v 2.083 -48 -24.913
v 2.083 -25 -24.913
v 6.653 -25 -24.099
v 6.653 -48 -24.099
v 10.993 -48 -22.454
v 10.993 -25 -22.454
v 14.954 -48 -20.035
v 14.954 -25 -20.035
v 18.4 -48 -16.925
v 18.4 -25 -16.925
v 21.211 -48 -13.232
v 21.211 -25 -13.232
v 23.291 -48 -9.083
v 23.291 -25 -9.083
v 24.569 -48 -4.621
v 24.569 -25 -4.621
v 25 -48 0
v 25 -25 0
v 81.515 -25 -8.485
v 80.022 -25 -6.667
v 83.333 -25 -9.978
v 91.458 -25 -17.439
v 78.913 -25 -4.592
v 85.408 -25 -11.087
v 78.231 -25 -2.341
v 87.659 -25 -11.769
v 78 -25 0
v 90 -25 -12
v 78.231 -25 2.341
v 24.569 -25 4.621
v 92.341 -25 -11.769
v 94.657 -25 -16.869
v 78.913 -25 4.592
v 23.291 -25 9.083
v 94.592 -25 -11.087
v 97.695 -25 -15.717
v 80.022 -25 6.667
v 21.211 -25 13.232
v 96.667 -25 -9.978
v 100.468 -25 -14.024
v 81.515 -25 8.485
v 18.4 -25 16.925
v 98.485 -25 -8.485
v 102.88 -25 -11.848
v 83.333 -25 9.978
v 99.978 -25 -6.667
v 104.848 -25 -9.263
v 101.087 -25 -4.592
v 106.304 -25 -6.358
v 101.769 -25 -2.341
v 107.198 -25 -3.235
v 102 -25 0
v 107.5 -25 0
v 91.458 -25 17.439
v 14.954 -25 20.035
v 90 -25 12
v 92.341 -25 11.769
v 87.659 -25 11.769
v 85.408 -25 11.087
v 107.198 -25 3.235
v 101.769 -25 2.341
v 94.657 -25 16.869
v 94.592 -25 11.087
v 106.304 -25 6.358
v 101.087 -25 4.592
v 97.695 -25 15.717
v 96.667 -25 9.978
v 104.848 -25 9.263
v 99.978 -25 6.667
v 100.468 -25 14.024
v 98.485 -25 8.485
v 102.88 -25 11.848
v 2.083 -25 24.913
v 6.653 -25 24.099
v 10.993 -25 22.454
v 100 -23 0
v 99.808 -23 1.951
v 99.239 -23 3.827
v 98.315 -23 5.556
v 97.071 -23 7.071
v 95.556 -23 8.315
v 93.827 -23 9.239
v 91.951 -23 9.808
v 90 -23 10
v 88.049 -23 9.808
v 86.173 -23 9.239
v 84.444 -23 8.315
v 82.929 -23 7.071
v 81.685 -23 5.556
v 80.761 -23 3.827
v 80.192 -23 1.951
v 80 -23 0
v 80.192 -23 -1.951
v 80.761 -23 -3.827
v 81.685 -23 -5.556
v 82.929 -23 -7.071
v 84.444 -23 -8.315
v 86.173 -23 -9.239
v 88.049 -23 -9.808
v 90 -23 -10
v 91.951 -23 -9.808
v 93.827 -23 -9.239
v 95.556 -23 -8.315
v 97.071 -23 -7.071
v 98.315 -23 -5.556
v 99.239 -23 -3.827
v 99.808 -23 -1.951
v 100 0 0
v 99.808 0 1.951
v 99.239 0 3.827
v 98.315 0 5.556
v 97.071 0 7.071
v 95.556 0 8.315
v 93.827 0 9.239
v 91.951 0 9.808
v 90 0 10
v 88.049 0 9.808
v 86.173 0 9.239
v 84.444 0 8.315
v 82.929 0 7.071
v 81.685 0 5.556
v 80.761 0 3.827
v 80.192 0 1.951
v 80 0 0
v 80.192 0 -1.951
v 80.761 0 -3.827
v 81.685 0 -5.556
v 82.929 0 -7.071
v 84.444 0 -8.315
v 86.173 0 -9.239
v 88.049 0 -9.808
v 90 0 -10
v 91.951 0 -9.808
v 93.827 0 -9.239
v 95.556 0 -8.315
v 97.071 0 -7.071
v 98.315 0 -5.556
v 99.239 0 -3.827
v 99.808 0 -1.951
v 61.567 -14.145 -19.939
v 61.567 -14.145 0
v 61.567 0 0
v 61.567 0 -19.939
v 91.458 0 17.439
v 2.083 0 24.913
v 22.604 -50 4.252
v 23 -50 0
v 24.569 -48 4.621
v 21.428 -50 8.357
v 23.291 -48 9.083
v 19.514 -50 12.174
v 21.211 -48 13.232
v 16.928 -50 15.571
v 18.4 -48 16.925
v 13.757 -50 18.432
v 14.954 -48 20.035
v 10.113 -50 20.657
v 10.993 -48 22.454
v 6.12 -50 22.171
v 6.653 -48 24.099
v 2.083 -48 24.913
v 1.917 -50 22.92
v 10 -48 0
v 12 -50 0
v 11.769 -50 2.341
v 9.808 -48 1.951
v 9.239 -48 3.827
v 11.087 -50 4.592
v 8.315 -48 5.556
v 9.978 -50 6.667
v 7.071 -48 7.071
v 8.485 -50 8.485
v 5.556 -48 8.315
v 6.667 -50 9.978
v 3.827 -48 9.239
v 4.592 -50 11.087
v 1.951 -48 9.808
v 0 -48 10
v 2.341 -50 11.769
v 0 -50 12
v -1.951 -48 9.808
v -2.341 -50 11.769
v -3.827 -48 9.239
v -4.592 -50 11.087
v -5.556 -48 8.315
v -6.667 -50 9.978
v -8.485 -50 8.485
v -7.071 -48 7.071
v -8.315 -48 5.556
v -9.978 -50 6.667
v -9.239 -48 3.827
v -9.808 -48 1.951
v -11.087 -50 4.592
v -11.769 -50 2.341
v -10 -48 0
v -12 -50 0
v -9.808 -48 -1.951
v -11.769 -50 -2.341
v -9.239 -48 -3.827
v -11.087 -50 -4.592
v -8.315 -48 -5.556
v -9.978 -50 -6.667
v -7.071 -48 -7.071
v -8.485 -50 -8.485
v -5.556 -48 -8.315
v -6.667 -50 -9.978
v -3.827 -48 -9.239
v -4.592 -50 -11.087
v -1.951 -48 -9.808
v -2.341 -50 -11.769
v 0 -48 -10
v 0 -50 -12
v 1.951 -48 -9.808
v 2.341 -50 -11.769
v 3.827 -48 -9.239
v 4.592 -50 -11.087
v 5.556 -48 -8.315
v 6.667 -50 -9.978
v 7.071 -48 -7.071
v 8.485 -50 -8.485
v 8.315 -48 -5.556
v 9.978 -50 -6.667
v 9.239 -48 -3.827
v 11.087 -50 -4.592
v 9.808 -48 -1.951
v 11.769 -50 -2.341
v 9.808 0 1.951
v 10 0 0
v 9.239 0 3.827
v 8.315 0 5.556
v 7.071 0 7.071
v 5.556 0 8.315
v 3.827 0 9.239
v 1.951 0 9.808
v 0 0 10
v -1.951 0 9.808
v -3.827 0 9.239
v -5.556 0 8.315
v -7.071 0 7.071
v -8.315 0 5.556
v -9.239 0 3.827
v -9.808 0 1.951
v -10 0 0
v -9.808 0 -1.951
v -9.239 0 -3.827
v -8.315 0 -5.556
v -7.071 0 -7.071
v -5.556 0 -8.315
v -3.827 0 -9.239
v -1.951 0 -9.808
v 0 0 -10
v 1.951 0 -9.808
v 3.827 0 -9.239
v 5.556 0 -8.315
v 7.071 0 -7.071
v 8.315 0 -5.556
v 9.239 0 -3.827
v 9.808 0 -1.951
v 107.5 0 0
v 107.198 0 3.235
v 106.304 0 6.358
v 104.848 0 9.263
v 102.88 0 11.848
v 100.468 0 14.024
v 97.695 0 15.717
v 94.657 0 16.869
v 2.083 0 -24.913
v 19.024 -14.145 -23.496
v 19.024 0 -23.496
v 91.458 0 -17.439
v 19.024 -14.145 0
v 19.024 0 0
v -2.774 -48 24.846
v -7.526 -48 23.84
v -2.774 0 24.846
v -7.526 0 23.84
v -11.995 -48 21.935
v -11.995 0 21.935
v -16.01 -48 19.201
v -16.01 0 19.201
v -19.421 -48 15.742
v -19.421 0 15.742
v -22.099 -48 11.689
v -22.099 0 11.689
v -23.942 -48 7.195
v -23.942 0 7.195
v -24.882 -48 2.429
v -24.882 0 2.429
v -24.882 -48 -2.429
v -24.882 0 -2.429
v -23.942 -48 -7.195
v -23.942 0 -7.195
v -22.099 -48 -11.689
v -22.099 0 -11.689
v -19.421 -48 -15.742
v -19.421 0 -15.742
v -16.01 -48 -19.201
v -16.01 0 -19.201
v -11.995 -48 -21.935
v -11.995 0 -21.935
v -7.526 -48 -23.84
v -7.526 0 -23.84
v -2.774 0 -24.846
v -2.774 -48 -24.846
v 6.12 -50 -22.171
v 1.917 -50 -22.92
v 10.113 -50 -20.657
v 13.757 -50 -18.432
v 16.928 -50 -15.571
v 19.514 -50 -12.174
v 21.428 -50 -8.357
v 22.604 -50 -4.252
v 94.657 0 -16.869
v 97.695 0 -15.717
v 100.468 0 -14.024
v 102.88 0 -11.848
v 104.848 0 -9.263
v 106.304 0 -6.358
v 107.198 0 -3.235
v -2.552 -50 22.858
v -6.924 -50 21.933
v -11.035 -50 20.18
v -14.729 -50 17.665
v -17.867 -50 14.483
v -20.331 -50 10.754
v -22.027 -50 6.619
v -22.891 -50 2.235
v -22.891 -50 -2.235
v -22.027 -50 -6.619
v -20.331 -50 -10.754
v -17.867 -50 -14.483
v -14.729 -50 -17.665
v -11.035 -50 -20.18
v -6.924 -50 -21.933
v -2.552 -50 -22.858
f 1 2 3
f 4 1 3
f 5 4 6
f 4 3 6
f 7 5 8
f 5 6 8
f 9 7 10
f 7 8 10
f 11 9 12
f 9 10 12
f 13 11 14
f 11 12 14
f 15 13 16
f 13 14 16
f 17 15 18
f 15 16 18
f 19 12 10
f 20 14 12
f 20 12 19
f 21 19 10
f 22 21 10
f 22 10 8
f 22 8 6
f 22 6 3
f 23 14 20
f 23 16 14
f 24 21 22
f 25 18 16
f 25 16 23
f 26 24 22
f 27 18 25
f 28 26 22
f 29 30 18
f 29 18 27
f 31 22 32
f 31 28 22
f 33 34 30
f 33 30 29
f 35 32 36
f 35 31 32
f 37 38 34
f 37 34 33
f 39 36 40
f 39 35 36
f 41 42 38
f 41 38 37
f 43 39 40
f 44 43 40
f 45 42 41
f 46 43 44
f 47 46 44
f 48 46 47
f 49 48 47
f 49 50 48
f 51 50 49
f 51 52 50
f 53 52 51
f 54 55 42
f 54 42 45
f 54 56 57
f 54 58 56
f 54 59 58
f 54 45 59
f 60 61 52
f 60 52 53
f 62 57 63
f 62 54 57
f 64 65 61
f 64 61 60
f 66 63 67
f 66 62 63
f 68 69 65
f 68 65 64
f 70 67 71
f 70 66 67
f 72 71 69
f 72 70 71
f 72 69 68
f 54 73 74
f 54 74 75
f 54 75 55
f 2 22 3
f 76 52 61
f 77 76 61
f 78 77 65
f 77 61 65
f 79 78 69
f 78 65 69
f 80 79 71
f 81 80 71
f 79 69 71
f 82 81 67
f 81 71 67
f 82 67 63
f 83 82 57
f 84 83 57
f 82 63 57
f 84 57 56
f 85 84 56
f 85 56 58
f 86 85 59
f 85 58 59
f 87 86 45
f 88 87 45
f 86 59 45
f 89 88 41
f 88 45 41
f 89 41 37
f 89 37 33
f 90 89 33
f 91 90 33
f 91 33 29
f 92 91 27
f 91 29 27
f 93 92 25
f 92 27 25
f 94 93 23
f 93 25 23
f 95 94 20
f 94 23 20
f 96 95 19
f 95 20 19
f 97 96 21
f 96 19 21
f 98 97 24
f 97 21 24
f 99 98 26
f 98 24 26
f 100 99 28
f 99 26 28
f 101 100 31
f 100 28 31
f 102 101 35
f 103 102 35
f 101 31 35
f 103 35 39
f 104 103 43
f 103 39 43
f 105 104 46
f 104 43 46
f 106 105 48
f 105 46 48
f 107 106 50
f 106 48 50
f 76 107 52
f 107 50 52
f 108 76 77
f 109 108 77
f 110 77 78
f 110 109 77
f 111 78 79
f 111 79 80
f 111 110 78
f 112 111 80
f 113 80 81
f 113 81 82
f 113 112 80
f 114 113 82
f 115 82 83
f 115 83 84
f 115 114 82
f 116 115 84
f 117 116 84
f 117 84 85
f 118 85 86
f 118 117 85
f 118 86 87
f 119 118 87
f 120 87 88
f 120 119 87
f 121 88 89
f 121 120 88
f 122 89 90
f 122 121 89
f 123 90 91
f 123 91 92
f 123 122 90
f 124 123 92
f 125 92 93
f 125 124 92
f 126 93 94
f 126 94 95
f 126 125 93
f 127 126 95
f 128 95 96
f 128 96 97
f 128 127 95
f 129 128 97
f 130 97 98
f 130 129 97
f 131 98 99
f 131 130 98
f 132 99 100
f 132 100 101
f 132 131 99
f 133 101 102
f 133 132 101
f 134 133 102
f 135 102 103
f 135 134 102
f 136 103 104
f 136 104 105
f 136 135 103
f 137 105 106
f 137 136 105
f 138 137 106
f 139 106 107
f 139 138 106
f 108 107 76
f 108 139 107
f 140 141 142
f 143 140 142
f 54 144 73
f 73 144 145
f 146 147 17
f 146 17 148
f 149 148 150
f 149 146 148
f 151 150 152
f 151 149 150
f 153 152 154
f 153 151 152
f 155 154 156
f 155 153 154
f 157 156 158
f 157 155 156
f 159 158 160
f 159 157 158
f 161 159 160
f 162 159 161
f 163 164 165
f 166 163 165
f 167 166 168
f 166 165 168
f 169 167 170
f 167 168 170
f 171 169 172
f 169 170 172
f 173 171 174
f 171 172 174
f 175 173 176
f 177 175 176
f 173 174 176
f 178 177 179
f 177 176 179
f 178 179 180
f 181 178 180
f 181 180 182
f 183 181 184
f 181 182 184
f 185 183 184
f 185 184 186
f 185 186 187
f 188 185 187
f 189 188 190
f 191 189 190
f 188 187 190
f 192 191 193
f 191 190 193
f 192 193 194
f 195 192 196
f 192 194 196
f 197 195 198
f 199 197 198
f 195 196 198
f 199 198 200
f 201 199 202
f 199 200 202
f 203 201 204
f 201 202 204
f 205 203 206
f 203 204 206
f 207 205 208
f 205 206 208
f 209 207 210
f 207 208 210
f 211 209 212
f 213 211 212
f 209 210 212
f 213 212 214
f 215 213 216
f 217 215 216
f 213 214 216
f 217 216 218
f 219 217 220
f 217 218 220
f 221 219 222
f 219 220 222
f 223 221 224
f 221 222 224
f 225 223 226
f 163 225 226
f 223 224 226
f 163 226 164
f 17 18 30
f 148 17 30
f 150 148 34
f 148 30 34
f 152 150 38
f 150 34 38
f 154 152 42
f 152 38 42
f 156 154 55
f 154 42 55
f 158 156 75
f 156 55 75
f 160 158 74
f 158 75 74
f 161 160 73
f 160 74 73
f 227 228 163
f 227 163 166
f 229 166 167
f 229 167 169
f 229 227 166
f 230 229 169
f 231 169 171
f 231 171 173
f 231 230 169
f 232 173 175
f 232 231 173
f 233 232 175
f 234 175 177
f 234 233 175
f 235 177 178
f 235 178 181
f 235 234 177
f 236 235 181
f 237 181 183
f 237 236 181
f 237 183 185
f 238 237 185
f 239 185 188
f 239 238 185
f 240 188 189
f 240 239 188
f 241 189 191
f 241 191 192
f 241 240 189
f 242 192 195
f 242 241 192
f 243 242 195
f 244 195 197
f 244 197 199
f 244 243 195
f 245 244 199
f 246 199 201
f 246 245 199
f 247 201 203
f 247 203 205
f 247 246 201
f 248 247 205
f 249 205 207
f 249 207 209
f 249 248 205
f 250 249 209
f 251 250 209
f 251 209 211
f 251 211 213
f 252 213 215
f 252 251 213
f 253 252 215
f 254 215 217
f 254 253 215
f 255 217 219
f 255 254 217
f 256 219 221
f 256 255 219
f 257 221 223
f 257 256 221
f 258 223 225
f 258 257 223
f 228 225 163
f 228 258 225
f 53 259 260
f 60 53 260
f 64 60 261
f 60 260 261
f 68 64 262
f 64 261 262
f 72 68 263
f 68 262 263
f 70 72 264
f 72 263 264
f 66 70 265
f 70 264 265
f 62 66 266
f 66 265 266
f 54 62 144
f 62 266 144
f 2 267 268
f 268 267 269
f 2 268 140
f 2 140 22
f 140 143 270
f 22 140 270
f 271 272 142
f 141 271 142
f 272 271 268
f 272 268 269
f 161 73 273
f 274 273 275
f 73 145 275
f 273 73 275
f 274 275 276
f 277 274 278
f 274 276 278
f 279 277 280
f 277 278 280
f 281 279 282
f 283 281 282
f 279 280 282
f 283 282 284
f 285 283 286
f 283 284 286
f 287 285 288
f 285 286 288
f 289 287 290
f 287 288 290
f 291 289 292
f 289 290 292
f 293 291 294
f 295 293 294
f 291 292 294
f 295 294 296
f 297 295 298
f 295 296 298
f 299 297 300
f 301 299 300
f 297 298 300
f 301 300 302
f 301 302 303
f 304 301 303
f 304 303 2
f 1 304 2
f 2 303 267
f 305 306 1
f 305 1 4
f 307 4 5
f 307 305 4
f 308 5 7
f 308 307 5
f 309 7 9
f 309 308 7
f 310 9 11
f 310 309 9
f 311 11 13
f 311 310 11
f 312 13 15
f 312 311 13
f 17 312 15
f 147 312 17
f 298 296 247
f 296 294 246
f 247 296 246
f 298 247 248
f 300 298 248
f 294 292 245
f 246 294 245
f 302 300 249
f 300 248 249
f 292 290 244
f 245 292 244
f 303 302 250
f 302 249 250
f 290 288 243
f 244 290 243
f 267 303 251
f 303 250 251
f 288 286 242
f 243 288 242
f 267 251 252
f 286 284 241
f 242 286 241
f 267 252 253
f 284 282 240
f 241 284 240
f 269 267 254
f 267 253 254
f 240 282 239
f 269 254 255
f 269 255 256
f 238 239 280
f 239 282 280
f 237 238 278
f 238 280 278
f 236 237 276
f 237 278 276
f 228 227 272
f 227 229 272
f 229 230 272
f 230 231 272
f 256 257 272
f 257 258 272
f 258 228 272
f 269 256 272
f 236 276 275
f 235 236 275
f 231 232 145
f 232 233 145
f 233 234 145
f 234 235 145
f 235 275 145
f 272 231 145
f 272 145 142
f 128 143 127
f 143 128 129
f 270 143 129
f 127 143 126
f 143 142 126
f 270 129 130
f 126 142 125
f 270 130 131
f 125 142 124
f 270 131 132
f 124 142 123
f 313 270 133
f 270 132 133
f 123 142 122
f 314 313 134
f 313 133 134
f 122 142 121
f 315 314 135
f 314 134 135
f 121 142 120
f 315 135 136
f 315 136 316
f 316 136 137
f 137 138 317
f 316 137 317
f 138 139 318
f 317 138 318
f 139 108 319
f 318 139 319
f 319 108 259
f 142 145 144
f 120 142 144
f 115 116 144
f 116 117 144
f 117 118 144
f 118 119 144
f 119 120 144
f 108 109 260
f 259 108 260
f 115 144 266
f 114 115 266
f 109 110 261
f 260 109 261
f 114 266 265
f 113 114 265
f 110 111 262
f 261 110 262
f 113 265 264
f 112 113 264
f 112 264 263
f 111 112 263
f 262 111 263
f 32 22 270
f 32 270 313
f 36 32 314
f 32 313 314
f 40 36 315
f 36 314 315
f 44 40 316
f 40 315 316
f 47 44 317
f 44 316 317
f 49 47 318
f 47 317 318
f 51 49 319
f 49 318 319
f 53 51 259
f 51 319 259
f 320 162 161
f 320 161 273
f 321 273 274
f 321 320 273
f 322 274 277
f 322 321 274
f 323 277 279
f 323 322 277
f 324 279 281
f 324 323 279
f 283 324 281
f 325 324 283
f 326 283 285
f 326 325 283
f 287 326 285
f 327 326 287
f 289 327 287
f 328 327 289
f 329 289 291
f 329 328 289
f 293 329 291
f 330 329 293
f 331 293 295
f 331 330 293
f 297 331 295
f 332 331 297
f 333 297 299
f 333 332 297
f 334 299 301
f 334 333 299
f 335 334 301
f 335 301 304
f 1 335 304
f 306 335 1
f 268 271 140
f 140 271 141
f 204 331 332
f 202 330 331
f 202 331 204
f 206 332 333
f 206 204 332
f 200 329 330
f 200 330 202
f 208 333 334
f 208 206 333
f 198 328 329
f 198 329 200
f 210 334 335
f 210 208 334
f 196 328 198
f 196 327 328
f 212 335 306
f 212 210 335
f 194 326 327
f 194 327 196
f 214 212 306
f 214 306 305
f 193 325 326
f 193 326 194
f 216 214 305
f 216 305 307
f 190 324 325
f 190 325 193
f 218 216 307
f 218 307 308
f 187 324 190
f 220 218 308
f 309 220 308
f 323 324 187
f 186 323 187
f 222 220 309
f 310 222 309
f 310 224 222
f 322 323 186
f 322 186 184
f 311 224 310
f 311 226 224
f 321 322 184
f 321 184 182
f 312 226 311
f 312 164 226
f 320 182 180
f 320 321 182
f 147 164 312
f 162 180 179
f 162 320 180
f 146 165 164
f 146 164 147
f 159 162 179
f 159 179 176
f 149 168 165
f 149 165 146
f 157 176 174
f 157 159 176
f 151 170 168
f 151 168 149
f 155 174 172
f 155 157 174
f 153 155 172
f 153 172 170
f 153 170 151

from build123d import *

# Parameters (mm, degrees)
F0_R     = 10
F1_DEPTH = 25
F2_DEPTH = 50
F3_SIZE  = 2
F4_W     = 42.542353
F4_H     = 60.176491
F5_DEPTH = 25


with BuildPart() as f1:
    # F0 (on Front) → F1 (new body)
    with BuildSketch(Plane.XZ):
        with BuildLine():
            ThreePointArc((2.083333, -24.913043), (18.399502, -16.92508), (25, 0))
            ThreePointArc((25, 0), (18.399502, 16.92508), (2.083333, 24.913043))
            ThreePointArc((2.083333, 24.913043), (-25, 0), (2.083333, -24.913043))
        make_face()
        Circle(F0_R, mode=Mode.SUBTRACT)
        with BuildLine():
            ThreePointArc((2.083333, 24.913043), (18.399502, 16.92508), (25, 0))
            ThreePointArc((25, 0), (18.399502, -16.92508), (2.083333, -24.913043))
            Line((2.083333, -24.913043), (91.458333, -17.43913))
            ThreePointArc((91.458333, -17.43913), (72.5, 0), (91.458333, 17.43913))
            Line((91.458333, 17.43913), (2.083333, 24.913043))
        make_face()
        with BuildLine():
            ThreePointArc((107.5, 0), (102.879651, 11.847556), (91.458333, 17.43913))
            ThreePointArc((91.458333, 17.43913), (72.5, 0), (91.458333, -17.43913))
            ThreePointArc((91.458333, -17.43913), (102.879651, -11.847556), (107.5, 0))
        make_face()
        with Locations((90, 0)):
            Circle(F0_R, mode=Mode.SUBTRACT)
    extrude(amount=F1_DEPTH)

    # F0 (on Front) → F2 (join)
    with BuildSketch(Plane.XZ):
        with BuildLine():
            ThreePointArc((2.083333, -24.913043), (18.399502, -16.92508), (25, 0))
            ThreePointArc((25, 0), (18.399502, 16.92508), (2.083333, 24.913043))
            ThreePointArc((2.083333, 24.913043), (-25, 0), (2.083333, -24.913043))
        make_face()
        Circle(F0_R, mode=Mode.SUBTRACT)
    extrude(amount=F2_DEPTH)

    # F3
    f3_edges = [f1.edges().sort_by_distance(p)[0] for p in [
        (-2.083333, -50, 24.913043),
        (-10, -50, 0),
        (80, -25, 0),
    ]]
    chamfer(f3_edges, length=F3_SIZE)

    # F4 (on Top) → F5 (cut)
    with BuildSketch(Plane.XY):
        with Locations((40.295548, 15.942938)):
            Rectangle(F4_W, F4_H)
    extrude(amount=-F5_DEPTH, mode=Mode.SUBTRACT)


solid = f1.part
